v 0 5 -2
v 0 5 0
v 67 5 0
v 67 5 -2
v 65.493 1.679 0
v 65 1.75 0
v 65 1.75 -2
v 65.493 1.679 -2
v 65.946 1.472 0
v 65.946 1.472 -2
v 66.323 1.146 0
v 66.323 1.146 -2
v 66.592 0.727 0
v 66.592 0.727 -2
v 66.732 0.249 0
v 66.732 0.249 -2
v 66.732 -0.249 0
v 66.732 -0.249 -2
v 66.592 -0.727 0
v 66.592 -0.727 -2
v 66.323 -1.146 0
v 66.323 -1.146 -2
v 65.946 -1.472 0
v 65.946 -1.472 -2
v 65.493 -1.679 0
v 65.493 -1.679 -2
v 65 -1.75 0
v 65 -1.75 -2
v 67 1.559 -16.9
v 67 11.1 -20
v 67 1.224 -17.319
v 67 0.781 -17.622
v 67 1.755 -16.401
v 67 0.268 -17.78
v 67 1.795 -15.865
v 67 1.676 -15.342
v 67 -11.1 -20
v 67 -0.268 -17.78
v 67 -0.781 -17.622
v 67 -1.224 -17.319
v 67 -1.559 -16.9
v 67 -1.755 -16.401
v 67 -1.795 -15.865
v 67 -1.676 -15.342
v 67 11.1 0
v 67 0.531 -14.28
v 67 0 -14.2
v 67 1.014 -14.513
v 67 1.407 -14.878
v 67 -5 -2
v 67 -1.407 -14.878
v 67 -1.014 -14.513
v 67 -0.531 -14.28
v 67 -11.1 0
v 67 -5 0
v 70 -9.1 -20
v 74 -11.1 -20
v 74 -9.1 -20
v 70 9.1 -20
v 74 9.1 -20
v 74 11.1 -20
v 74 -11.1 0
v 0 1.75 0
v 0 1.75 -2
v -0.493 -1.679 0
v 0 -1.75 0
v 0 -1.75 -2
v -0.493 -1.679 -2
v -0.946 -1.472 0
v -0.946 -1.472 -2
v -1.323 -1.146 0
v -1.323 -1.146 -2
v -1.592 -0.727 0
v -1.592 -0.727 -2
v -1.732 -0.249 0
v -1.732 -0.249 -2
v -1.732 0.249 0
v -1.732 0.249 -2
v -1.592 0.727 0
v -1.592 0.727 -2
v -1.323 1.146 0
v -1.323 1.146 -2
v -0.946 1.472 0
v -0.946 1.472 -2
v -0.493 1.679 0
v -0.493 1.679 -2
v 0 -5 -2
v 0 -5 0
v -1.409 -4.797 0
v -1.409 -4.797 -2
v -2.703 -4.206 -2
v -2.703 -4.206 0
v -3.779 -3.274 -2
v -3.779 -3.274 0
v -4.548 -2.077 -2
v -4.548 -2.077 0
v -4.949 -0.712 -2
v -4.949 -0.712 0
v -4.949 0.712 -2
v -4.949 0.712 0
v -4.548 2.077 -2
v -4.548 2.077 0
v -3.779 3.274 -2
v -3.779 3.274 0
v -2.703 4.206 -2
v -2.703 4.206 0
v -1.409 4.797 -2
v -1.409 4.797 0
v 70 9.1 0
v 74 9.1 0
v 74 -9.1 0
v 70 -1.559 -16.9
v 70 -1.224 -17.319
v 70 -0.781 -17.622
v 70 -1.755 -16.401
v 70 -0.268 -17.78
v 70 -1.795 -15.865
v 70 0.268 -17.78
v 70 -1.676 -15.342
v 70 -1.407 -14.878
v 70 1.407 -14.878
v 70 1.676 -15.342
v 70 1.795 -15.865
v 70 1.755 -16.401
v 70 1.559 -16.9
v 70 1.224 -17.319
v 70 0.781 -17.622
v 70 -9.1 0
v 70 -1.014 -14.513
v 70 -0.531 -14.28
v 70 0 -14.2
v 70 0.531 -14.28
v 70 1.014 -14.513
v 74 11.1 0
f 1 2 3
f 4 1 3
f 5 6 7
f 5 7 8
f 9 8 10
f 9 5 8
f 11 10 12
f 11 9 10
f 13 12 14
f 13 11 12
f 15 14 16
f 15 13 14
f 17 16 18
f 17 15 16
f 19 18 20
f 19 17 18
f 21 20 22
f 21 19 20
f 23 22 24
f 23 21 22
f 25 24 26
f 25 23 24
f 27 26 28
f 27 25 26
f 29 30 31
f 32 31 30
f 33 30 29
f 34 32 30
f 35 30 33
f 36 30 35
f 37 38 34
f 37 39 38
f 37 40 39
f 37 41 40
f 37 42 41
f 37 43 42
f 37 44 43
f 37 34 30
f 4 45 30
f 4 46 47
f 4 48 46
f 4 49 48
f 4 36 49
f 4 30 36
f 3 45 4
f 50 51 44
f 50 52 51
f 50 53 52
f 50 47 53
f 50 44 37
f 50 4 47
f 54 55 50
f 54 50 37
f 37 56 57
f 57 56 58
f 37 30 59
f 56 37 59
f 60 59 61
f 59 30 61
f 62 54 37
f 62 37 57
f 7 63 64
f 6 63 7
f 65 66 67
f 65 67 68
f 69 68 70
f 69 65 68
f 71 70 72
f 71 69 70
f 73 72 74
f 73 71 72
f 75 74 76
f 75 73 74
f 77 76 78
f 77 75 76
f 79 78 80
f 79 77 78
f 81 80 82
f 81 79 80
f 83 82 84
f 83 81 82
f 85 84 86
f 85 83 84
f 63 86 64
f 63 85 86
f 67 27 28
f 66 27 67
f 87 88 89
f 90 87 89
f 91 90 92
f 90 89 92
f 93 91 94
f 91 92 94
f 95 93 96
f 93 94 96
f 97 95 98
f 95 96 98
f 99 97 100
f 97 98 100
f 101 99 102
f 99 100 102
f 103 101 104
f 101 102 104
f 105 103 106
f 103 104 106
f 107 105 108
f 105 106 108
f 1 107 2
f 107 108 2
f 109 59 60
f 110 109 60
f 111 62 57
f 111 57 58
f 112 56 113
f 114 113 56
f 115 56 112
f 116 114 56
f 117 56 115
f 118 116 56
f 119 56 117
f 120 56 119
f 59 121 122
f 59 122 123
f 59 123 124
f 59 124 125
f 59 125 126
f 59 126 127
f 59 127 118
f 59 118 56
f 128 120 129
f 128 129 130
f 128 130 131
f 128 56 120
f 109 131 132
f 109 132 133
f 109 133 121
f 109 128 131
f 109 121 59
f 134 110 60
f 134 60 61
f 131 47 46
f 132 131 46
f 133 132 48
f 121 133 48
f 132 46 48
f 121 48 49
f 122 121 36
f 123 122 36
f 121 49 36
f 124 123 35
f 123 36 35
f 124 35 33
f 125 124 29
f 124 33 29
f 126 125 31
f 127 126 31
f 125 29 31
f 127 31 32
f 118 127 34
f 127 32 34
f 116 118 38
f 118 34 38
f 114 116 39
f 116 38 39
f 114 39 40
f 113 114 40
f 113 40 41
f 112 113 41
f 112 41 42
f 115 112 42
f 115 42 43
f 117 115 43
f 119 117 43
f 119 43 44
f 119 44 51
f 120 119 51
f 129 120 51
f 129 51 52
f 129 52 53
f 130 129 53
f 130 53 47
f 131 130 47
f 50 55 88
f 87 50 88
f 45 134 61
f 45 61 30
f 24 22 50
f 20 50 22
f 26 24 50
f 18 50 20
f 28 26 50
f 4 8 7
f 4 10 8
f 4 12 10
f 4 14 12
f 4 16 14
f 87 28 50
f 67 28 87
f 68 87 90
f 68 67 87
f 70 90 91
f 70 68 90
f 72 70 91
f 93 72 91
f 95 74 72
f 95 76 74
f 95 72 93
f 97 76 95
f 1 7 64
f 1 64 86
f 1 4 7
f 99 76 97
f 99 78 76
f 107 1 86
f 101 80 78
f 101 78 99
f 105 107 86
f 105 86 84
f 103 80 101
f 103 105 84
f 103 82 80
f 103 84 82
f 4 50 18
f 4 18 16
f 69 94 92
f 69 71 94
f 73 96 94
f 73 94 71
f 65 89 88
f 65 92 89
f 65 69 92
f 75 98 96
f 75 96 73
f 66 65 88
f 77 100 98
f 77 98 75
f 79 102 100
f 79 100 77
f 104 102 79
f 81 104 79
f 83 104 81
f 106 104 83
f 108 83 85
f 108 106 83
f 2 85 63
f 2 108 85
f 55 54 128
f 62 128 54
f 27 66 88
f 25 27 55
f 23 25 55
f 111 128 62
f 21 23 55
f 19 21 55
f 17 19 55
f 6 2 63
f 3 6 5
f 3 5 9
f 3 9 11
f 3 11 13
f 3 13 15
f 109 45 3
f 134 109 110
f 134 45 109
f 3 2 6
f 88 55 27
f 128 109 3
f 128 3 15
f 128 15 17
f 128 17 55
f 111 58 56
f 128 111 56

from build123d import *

# Parameters (mm, degrees)
BOSS_EXTRUDE1_DEPTH = 2
BOSS_EXTRUDE2_DEPTH = 20
SKETCH3_R           = 1.8
CUT_EXTRUDE1_DEPTH  = 15


with BuildPart() as part:
    # Sketch1 → Boss-Extrude1 (new body)
    with BuildSketch(Plane.XY):
        with BuildLine():
            Line((0, 5), (70, 5))
            Line((70, 5), (70, -5))
            Line((70, -5), (0, -5))
            ThreePointArc((0, -5), (-5, 0), (0, 5))
        make_face()
        with BuildLine():
            Line((0, 1.75), (65, 1.75))
            ThreePointArc((65, 1.75), (66.75, 0), (65, -1.75))
            Line((65, -1.75), (0, -1.75))
            ThreePointArc((0, -1.75), (-1.75, 0), (0, 1.75))
        make_face(mode=Mode.SUBTRACT)
    extrude(amount=-BOSS_EXTRUDE1_DEPTH)

    # Sketch2 → Boss-Extrude2 (add)
    with BuildSketch(Plane.XY):
        Polygon((74, 11.1), (67, 11.1), (67, -11.1), (74, -11.1), (74, -9.1), (70, -9.1), (70, 9.1), (74, 9.1), align=None)
    extrude(amount=-BOSS_EXTRUDE2_DEPTH)

    # Sketch3 → Cut-Extrude1 (cut)
    with BuildSketch(Plane.ZY.offset(-67)):
        with Locations((-16, 0)):
            Circle(SKETCH3_R)
    extrude(amount=-CUT_EXTRUDE1_DEPTH, mode=Mode.SUBTRACT)


solid = part.part
